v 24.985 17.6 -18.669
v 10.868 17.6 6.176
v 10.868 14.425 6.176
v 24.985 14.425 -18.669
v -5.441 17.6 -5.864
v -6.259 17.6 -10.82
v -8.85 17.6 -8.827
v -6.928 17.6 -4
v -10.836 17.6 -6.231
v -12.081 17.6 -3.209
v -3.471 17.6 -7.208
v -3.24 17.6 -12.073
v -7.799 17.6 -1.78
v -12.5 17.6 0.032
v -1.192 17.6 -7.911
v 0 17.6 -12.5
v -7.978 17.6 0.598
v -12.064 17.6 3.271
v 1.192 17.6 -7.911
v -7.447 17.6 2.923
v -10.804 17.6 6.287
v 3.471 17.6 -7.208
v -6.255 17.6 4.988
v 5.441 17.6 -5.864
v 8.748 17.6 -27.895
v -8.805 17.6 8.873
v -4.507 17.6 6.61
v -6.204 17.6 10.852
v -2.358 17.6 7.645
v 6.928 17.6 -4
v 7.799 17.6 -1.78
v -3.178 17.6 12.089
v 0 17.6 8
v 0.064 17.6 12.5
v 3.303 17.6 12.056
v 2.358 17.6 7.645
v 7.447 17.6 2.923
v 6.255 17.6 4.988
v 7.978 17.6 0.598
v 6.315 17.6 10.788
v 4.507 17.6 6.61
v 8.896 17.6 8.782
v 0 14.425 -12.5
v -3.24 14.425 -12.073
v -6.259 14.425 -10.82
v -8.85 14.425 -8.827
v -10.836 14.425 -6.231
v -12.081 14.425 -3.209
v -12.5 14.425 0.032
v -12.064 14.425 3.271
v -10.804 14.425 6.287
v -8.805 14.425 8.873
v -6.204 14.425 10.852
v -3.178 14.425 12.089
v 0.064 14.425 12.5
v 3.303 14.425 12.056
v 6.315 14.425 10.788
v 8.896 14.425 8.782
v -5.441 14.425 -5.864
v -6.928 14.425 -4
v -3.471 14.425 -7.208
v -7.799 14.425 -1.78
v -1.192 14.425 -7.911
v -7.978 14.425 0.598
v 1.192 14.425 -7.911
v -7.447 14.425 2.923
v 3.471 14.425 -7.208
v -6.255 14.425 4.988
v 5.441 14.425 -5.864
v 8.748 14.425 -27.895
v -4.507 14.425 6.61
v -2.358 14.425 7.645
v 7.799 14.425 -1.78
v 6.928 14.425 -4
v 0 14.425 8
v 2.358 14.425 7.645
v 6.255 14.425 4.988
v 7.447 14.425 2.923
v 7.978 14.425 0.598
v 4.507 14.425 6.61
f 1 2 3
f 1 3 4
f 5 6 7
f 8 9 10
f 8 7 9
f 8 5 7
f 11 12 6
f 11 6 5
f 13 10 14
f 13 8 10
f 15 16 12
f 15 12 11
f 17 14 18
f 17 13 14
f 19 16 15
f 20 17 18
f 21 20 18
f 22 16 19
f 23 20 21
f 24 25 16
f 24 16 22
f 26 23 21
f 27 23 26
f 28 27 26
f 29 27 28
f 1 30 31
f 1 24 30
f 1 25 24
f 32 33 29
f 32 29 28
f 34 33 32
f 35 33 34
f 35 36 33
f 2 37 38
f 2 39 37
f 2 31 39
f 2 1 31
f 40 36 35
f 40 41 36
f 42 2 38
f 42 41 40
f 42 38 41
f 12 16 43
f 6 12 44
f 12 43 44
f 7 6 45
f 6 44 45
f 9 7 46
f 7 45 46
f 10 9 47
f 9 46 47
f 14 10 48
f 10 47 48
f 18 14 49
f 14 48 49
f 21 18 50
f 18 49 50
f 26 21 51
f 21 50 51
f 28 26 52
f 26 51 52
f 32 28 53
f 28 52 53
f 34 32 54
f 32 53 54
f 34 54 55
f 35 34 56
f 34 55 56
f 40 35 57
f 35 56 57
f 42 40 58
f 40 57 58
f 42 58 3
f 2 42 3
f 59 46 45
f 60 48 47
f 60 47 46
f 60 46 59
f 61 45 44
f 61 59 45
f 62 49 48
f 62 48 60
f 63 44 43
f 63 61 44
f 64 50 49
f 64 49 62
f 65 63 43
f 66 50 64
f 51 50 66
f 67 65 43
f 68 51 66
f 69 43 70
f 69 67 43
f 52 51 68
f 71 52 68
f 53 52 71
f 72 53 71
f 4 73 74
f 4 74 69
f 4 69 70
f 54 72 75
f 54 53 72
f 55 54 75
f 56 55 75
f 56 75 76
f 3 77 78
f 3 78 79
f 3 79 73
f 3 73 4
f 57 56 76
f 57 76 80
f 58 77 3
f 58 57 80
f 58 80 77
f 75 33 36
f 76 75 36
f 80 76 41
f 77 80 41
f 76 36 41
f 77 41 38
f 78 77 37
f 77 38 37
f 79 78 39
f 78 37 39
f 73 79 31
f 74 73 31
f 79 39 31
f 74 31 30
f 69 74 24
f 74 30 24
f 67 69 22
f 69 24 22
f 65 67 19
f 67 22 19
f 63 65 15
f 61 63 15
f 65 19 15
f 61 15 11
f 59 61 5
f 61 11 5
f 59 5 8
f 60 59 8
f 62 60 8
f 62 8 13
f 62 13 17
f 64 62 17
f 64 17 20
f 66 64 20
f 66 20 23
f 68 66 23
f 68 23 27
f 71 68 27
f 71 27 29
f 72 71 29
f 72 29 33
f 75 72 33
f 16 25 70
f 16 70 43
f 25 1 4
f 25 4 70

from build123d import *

# Parameters (mm, degrees)
SKETCH1_R           = 12.5
BOSS_EXTRUDE1_DEPTH = 17.6
SKETCH2_R           = 5.5
CUT_EXTRUDE1_DEPTH  = 50.8
SKETCH3_R           = 8
CUT_EXTRUDE3_DEPTH  = 15.6
BOSS_EXTRUDE2_DEPTH = 17.6
SKETCH6_R           = 8
SKETCH6_R_2         = 5.5
CUT_EXTRUDE5_DEPTH  = 14.425


with BuildPart() as part:
    # Sketch1 → Boss-Extrude1 (new body)
    with BuildSketch(Plane(origin=(0, 0, 0), x_dir=(1, 0, 0), z_dir=(0, 1, 0))):
        with Locations(Location((0, 0, 0), (0, 0, 270))):
            Circle(SKETCH1_R)
    extrude(amount=BOSS_EXTRUDE1_DEPTH)

    # Sketch2 → Cut-Extrude1 (cut)
    with BuildSketch(Plane(origin=(0, 17.6, 0), x_dir=(1, 0, 0), z_dir=(0, 1, 0))):
        with Locations(Location((0, 0, 0), (0, 0, 270))):
            Circle(SKETCH2_R)
    extrude(amount=-CUT_EXTRUDE1_DEPTH, mode=Mode.SUBTRACT)

    # Sketch3 → Cut-Extrude3 (cut)
    with BuildSketch(Plane(origin=(0, 17.6, 0), x_dir=(1, 0, 0), z_dir=(0, 1, 0))):
        with Locations(Location((0, 0, 0), (0, 0, 270))):
            Circle(SKETCH3_R)
    extrude(amount=-CUT_EXTRUDE3_DEPTH, mode=Mode.SUBTRACT)

    # Sketch5 → Boss-Extrude2 (add, through all)
    with BuildSketch(Plane(origin=(0, 17.6, 0), x_dir=(1, 0, 0), z_dir=(0, 1, 0))):
        with BuildLine():
            ThreePointArc((12.5, 0), (12.085103338, -3.193787298), (10.867955631, -6.175559927))
            Line((10.867955631, -6.175559927), (24.985285623, 18.668586645))
            Line((24.985285623, 18.668586645), (8.74807309, 27.895149805))
            Line((8.74807309, 27.895149805), (0, 12.5))
            ThreePointArc((0, 12.5), (8.838834765, 8.838834765), (12.5, 0))
        make_face()
    extrude(amount=-BOSS_EXTRUDE2_DEPTH)

    # Sketch6 → Cut-Extrude5 (cut)
    with BuildSketch(Plane.XZ):
        with BuildLine():
            Line((24.985285623, -18.668586645), (10.867955631, 6.175559927))
            ThreePointArc((10.867955631, 6.175559927), (-10.803807178, 6.287109865), (0, -12.5))
            Line((0, -12.5), (8.74807309, -27.895149805))
            Line((8.74807309, -27.895149805), (24.985285623, -18.668586645))
        make_face()
        with Locations(Location((0, 0, 0), (0, 0, 90))):
            Circle(SKETCH6_R, mode=Mode.SUBTRACT)
        with Locations(Location((0, 0, 0), (0, 0, 90))):
            Circle(SKETCH6_R)
        Circle(SKETCH6_R_2, mode=Mode.SUBTRACT)
    extrude(amount=-CUT_EXTRUDE5_DEPTH, mode=Mode.SUBTRACT)


solid = part.part
